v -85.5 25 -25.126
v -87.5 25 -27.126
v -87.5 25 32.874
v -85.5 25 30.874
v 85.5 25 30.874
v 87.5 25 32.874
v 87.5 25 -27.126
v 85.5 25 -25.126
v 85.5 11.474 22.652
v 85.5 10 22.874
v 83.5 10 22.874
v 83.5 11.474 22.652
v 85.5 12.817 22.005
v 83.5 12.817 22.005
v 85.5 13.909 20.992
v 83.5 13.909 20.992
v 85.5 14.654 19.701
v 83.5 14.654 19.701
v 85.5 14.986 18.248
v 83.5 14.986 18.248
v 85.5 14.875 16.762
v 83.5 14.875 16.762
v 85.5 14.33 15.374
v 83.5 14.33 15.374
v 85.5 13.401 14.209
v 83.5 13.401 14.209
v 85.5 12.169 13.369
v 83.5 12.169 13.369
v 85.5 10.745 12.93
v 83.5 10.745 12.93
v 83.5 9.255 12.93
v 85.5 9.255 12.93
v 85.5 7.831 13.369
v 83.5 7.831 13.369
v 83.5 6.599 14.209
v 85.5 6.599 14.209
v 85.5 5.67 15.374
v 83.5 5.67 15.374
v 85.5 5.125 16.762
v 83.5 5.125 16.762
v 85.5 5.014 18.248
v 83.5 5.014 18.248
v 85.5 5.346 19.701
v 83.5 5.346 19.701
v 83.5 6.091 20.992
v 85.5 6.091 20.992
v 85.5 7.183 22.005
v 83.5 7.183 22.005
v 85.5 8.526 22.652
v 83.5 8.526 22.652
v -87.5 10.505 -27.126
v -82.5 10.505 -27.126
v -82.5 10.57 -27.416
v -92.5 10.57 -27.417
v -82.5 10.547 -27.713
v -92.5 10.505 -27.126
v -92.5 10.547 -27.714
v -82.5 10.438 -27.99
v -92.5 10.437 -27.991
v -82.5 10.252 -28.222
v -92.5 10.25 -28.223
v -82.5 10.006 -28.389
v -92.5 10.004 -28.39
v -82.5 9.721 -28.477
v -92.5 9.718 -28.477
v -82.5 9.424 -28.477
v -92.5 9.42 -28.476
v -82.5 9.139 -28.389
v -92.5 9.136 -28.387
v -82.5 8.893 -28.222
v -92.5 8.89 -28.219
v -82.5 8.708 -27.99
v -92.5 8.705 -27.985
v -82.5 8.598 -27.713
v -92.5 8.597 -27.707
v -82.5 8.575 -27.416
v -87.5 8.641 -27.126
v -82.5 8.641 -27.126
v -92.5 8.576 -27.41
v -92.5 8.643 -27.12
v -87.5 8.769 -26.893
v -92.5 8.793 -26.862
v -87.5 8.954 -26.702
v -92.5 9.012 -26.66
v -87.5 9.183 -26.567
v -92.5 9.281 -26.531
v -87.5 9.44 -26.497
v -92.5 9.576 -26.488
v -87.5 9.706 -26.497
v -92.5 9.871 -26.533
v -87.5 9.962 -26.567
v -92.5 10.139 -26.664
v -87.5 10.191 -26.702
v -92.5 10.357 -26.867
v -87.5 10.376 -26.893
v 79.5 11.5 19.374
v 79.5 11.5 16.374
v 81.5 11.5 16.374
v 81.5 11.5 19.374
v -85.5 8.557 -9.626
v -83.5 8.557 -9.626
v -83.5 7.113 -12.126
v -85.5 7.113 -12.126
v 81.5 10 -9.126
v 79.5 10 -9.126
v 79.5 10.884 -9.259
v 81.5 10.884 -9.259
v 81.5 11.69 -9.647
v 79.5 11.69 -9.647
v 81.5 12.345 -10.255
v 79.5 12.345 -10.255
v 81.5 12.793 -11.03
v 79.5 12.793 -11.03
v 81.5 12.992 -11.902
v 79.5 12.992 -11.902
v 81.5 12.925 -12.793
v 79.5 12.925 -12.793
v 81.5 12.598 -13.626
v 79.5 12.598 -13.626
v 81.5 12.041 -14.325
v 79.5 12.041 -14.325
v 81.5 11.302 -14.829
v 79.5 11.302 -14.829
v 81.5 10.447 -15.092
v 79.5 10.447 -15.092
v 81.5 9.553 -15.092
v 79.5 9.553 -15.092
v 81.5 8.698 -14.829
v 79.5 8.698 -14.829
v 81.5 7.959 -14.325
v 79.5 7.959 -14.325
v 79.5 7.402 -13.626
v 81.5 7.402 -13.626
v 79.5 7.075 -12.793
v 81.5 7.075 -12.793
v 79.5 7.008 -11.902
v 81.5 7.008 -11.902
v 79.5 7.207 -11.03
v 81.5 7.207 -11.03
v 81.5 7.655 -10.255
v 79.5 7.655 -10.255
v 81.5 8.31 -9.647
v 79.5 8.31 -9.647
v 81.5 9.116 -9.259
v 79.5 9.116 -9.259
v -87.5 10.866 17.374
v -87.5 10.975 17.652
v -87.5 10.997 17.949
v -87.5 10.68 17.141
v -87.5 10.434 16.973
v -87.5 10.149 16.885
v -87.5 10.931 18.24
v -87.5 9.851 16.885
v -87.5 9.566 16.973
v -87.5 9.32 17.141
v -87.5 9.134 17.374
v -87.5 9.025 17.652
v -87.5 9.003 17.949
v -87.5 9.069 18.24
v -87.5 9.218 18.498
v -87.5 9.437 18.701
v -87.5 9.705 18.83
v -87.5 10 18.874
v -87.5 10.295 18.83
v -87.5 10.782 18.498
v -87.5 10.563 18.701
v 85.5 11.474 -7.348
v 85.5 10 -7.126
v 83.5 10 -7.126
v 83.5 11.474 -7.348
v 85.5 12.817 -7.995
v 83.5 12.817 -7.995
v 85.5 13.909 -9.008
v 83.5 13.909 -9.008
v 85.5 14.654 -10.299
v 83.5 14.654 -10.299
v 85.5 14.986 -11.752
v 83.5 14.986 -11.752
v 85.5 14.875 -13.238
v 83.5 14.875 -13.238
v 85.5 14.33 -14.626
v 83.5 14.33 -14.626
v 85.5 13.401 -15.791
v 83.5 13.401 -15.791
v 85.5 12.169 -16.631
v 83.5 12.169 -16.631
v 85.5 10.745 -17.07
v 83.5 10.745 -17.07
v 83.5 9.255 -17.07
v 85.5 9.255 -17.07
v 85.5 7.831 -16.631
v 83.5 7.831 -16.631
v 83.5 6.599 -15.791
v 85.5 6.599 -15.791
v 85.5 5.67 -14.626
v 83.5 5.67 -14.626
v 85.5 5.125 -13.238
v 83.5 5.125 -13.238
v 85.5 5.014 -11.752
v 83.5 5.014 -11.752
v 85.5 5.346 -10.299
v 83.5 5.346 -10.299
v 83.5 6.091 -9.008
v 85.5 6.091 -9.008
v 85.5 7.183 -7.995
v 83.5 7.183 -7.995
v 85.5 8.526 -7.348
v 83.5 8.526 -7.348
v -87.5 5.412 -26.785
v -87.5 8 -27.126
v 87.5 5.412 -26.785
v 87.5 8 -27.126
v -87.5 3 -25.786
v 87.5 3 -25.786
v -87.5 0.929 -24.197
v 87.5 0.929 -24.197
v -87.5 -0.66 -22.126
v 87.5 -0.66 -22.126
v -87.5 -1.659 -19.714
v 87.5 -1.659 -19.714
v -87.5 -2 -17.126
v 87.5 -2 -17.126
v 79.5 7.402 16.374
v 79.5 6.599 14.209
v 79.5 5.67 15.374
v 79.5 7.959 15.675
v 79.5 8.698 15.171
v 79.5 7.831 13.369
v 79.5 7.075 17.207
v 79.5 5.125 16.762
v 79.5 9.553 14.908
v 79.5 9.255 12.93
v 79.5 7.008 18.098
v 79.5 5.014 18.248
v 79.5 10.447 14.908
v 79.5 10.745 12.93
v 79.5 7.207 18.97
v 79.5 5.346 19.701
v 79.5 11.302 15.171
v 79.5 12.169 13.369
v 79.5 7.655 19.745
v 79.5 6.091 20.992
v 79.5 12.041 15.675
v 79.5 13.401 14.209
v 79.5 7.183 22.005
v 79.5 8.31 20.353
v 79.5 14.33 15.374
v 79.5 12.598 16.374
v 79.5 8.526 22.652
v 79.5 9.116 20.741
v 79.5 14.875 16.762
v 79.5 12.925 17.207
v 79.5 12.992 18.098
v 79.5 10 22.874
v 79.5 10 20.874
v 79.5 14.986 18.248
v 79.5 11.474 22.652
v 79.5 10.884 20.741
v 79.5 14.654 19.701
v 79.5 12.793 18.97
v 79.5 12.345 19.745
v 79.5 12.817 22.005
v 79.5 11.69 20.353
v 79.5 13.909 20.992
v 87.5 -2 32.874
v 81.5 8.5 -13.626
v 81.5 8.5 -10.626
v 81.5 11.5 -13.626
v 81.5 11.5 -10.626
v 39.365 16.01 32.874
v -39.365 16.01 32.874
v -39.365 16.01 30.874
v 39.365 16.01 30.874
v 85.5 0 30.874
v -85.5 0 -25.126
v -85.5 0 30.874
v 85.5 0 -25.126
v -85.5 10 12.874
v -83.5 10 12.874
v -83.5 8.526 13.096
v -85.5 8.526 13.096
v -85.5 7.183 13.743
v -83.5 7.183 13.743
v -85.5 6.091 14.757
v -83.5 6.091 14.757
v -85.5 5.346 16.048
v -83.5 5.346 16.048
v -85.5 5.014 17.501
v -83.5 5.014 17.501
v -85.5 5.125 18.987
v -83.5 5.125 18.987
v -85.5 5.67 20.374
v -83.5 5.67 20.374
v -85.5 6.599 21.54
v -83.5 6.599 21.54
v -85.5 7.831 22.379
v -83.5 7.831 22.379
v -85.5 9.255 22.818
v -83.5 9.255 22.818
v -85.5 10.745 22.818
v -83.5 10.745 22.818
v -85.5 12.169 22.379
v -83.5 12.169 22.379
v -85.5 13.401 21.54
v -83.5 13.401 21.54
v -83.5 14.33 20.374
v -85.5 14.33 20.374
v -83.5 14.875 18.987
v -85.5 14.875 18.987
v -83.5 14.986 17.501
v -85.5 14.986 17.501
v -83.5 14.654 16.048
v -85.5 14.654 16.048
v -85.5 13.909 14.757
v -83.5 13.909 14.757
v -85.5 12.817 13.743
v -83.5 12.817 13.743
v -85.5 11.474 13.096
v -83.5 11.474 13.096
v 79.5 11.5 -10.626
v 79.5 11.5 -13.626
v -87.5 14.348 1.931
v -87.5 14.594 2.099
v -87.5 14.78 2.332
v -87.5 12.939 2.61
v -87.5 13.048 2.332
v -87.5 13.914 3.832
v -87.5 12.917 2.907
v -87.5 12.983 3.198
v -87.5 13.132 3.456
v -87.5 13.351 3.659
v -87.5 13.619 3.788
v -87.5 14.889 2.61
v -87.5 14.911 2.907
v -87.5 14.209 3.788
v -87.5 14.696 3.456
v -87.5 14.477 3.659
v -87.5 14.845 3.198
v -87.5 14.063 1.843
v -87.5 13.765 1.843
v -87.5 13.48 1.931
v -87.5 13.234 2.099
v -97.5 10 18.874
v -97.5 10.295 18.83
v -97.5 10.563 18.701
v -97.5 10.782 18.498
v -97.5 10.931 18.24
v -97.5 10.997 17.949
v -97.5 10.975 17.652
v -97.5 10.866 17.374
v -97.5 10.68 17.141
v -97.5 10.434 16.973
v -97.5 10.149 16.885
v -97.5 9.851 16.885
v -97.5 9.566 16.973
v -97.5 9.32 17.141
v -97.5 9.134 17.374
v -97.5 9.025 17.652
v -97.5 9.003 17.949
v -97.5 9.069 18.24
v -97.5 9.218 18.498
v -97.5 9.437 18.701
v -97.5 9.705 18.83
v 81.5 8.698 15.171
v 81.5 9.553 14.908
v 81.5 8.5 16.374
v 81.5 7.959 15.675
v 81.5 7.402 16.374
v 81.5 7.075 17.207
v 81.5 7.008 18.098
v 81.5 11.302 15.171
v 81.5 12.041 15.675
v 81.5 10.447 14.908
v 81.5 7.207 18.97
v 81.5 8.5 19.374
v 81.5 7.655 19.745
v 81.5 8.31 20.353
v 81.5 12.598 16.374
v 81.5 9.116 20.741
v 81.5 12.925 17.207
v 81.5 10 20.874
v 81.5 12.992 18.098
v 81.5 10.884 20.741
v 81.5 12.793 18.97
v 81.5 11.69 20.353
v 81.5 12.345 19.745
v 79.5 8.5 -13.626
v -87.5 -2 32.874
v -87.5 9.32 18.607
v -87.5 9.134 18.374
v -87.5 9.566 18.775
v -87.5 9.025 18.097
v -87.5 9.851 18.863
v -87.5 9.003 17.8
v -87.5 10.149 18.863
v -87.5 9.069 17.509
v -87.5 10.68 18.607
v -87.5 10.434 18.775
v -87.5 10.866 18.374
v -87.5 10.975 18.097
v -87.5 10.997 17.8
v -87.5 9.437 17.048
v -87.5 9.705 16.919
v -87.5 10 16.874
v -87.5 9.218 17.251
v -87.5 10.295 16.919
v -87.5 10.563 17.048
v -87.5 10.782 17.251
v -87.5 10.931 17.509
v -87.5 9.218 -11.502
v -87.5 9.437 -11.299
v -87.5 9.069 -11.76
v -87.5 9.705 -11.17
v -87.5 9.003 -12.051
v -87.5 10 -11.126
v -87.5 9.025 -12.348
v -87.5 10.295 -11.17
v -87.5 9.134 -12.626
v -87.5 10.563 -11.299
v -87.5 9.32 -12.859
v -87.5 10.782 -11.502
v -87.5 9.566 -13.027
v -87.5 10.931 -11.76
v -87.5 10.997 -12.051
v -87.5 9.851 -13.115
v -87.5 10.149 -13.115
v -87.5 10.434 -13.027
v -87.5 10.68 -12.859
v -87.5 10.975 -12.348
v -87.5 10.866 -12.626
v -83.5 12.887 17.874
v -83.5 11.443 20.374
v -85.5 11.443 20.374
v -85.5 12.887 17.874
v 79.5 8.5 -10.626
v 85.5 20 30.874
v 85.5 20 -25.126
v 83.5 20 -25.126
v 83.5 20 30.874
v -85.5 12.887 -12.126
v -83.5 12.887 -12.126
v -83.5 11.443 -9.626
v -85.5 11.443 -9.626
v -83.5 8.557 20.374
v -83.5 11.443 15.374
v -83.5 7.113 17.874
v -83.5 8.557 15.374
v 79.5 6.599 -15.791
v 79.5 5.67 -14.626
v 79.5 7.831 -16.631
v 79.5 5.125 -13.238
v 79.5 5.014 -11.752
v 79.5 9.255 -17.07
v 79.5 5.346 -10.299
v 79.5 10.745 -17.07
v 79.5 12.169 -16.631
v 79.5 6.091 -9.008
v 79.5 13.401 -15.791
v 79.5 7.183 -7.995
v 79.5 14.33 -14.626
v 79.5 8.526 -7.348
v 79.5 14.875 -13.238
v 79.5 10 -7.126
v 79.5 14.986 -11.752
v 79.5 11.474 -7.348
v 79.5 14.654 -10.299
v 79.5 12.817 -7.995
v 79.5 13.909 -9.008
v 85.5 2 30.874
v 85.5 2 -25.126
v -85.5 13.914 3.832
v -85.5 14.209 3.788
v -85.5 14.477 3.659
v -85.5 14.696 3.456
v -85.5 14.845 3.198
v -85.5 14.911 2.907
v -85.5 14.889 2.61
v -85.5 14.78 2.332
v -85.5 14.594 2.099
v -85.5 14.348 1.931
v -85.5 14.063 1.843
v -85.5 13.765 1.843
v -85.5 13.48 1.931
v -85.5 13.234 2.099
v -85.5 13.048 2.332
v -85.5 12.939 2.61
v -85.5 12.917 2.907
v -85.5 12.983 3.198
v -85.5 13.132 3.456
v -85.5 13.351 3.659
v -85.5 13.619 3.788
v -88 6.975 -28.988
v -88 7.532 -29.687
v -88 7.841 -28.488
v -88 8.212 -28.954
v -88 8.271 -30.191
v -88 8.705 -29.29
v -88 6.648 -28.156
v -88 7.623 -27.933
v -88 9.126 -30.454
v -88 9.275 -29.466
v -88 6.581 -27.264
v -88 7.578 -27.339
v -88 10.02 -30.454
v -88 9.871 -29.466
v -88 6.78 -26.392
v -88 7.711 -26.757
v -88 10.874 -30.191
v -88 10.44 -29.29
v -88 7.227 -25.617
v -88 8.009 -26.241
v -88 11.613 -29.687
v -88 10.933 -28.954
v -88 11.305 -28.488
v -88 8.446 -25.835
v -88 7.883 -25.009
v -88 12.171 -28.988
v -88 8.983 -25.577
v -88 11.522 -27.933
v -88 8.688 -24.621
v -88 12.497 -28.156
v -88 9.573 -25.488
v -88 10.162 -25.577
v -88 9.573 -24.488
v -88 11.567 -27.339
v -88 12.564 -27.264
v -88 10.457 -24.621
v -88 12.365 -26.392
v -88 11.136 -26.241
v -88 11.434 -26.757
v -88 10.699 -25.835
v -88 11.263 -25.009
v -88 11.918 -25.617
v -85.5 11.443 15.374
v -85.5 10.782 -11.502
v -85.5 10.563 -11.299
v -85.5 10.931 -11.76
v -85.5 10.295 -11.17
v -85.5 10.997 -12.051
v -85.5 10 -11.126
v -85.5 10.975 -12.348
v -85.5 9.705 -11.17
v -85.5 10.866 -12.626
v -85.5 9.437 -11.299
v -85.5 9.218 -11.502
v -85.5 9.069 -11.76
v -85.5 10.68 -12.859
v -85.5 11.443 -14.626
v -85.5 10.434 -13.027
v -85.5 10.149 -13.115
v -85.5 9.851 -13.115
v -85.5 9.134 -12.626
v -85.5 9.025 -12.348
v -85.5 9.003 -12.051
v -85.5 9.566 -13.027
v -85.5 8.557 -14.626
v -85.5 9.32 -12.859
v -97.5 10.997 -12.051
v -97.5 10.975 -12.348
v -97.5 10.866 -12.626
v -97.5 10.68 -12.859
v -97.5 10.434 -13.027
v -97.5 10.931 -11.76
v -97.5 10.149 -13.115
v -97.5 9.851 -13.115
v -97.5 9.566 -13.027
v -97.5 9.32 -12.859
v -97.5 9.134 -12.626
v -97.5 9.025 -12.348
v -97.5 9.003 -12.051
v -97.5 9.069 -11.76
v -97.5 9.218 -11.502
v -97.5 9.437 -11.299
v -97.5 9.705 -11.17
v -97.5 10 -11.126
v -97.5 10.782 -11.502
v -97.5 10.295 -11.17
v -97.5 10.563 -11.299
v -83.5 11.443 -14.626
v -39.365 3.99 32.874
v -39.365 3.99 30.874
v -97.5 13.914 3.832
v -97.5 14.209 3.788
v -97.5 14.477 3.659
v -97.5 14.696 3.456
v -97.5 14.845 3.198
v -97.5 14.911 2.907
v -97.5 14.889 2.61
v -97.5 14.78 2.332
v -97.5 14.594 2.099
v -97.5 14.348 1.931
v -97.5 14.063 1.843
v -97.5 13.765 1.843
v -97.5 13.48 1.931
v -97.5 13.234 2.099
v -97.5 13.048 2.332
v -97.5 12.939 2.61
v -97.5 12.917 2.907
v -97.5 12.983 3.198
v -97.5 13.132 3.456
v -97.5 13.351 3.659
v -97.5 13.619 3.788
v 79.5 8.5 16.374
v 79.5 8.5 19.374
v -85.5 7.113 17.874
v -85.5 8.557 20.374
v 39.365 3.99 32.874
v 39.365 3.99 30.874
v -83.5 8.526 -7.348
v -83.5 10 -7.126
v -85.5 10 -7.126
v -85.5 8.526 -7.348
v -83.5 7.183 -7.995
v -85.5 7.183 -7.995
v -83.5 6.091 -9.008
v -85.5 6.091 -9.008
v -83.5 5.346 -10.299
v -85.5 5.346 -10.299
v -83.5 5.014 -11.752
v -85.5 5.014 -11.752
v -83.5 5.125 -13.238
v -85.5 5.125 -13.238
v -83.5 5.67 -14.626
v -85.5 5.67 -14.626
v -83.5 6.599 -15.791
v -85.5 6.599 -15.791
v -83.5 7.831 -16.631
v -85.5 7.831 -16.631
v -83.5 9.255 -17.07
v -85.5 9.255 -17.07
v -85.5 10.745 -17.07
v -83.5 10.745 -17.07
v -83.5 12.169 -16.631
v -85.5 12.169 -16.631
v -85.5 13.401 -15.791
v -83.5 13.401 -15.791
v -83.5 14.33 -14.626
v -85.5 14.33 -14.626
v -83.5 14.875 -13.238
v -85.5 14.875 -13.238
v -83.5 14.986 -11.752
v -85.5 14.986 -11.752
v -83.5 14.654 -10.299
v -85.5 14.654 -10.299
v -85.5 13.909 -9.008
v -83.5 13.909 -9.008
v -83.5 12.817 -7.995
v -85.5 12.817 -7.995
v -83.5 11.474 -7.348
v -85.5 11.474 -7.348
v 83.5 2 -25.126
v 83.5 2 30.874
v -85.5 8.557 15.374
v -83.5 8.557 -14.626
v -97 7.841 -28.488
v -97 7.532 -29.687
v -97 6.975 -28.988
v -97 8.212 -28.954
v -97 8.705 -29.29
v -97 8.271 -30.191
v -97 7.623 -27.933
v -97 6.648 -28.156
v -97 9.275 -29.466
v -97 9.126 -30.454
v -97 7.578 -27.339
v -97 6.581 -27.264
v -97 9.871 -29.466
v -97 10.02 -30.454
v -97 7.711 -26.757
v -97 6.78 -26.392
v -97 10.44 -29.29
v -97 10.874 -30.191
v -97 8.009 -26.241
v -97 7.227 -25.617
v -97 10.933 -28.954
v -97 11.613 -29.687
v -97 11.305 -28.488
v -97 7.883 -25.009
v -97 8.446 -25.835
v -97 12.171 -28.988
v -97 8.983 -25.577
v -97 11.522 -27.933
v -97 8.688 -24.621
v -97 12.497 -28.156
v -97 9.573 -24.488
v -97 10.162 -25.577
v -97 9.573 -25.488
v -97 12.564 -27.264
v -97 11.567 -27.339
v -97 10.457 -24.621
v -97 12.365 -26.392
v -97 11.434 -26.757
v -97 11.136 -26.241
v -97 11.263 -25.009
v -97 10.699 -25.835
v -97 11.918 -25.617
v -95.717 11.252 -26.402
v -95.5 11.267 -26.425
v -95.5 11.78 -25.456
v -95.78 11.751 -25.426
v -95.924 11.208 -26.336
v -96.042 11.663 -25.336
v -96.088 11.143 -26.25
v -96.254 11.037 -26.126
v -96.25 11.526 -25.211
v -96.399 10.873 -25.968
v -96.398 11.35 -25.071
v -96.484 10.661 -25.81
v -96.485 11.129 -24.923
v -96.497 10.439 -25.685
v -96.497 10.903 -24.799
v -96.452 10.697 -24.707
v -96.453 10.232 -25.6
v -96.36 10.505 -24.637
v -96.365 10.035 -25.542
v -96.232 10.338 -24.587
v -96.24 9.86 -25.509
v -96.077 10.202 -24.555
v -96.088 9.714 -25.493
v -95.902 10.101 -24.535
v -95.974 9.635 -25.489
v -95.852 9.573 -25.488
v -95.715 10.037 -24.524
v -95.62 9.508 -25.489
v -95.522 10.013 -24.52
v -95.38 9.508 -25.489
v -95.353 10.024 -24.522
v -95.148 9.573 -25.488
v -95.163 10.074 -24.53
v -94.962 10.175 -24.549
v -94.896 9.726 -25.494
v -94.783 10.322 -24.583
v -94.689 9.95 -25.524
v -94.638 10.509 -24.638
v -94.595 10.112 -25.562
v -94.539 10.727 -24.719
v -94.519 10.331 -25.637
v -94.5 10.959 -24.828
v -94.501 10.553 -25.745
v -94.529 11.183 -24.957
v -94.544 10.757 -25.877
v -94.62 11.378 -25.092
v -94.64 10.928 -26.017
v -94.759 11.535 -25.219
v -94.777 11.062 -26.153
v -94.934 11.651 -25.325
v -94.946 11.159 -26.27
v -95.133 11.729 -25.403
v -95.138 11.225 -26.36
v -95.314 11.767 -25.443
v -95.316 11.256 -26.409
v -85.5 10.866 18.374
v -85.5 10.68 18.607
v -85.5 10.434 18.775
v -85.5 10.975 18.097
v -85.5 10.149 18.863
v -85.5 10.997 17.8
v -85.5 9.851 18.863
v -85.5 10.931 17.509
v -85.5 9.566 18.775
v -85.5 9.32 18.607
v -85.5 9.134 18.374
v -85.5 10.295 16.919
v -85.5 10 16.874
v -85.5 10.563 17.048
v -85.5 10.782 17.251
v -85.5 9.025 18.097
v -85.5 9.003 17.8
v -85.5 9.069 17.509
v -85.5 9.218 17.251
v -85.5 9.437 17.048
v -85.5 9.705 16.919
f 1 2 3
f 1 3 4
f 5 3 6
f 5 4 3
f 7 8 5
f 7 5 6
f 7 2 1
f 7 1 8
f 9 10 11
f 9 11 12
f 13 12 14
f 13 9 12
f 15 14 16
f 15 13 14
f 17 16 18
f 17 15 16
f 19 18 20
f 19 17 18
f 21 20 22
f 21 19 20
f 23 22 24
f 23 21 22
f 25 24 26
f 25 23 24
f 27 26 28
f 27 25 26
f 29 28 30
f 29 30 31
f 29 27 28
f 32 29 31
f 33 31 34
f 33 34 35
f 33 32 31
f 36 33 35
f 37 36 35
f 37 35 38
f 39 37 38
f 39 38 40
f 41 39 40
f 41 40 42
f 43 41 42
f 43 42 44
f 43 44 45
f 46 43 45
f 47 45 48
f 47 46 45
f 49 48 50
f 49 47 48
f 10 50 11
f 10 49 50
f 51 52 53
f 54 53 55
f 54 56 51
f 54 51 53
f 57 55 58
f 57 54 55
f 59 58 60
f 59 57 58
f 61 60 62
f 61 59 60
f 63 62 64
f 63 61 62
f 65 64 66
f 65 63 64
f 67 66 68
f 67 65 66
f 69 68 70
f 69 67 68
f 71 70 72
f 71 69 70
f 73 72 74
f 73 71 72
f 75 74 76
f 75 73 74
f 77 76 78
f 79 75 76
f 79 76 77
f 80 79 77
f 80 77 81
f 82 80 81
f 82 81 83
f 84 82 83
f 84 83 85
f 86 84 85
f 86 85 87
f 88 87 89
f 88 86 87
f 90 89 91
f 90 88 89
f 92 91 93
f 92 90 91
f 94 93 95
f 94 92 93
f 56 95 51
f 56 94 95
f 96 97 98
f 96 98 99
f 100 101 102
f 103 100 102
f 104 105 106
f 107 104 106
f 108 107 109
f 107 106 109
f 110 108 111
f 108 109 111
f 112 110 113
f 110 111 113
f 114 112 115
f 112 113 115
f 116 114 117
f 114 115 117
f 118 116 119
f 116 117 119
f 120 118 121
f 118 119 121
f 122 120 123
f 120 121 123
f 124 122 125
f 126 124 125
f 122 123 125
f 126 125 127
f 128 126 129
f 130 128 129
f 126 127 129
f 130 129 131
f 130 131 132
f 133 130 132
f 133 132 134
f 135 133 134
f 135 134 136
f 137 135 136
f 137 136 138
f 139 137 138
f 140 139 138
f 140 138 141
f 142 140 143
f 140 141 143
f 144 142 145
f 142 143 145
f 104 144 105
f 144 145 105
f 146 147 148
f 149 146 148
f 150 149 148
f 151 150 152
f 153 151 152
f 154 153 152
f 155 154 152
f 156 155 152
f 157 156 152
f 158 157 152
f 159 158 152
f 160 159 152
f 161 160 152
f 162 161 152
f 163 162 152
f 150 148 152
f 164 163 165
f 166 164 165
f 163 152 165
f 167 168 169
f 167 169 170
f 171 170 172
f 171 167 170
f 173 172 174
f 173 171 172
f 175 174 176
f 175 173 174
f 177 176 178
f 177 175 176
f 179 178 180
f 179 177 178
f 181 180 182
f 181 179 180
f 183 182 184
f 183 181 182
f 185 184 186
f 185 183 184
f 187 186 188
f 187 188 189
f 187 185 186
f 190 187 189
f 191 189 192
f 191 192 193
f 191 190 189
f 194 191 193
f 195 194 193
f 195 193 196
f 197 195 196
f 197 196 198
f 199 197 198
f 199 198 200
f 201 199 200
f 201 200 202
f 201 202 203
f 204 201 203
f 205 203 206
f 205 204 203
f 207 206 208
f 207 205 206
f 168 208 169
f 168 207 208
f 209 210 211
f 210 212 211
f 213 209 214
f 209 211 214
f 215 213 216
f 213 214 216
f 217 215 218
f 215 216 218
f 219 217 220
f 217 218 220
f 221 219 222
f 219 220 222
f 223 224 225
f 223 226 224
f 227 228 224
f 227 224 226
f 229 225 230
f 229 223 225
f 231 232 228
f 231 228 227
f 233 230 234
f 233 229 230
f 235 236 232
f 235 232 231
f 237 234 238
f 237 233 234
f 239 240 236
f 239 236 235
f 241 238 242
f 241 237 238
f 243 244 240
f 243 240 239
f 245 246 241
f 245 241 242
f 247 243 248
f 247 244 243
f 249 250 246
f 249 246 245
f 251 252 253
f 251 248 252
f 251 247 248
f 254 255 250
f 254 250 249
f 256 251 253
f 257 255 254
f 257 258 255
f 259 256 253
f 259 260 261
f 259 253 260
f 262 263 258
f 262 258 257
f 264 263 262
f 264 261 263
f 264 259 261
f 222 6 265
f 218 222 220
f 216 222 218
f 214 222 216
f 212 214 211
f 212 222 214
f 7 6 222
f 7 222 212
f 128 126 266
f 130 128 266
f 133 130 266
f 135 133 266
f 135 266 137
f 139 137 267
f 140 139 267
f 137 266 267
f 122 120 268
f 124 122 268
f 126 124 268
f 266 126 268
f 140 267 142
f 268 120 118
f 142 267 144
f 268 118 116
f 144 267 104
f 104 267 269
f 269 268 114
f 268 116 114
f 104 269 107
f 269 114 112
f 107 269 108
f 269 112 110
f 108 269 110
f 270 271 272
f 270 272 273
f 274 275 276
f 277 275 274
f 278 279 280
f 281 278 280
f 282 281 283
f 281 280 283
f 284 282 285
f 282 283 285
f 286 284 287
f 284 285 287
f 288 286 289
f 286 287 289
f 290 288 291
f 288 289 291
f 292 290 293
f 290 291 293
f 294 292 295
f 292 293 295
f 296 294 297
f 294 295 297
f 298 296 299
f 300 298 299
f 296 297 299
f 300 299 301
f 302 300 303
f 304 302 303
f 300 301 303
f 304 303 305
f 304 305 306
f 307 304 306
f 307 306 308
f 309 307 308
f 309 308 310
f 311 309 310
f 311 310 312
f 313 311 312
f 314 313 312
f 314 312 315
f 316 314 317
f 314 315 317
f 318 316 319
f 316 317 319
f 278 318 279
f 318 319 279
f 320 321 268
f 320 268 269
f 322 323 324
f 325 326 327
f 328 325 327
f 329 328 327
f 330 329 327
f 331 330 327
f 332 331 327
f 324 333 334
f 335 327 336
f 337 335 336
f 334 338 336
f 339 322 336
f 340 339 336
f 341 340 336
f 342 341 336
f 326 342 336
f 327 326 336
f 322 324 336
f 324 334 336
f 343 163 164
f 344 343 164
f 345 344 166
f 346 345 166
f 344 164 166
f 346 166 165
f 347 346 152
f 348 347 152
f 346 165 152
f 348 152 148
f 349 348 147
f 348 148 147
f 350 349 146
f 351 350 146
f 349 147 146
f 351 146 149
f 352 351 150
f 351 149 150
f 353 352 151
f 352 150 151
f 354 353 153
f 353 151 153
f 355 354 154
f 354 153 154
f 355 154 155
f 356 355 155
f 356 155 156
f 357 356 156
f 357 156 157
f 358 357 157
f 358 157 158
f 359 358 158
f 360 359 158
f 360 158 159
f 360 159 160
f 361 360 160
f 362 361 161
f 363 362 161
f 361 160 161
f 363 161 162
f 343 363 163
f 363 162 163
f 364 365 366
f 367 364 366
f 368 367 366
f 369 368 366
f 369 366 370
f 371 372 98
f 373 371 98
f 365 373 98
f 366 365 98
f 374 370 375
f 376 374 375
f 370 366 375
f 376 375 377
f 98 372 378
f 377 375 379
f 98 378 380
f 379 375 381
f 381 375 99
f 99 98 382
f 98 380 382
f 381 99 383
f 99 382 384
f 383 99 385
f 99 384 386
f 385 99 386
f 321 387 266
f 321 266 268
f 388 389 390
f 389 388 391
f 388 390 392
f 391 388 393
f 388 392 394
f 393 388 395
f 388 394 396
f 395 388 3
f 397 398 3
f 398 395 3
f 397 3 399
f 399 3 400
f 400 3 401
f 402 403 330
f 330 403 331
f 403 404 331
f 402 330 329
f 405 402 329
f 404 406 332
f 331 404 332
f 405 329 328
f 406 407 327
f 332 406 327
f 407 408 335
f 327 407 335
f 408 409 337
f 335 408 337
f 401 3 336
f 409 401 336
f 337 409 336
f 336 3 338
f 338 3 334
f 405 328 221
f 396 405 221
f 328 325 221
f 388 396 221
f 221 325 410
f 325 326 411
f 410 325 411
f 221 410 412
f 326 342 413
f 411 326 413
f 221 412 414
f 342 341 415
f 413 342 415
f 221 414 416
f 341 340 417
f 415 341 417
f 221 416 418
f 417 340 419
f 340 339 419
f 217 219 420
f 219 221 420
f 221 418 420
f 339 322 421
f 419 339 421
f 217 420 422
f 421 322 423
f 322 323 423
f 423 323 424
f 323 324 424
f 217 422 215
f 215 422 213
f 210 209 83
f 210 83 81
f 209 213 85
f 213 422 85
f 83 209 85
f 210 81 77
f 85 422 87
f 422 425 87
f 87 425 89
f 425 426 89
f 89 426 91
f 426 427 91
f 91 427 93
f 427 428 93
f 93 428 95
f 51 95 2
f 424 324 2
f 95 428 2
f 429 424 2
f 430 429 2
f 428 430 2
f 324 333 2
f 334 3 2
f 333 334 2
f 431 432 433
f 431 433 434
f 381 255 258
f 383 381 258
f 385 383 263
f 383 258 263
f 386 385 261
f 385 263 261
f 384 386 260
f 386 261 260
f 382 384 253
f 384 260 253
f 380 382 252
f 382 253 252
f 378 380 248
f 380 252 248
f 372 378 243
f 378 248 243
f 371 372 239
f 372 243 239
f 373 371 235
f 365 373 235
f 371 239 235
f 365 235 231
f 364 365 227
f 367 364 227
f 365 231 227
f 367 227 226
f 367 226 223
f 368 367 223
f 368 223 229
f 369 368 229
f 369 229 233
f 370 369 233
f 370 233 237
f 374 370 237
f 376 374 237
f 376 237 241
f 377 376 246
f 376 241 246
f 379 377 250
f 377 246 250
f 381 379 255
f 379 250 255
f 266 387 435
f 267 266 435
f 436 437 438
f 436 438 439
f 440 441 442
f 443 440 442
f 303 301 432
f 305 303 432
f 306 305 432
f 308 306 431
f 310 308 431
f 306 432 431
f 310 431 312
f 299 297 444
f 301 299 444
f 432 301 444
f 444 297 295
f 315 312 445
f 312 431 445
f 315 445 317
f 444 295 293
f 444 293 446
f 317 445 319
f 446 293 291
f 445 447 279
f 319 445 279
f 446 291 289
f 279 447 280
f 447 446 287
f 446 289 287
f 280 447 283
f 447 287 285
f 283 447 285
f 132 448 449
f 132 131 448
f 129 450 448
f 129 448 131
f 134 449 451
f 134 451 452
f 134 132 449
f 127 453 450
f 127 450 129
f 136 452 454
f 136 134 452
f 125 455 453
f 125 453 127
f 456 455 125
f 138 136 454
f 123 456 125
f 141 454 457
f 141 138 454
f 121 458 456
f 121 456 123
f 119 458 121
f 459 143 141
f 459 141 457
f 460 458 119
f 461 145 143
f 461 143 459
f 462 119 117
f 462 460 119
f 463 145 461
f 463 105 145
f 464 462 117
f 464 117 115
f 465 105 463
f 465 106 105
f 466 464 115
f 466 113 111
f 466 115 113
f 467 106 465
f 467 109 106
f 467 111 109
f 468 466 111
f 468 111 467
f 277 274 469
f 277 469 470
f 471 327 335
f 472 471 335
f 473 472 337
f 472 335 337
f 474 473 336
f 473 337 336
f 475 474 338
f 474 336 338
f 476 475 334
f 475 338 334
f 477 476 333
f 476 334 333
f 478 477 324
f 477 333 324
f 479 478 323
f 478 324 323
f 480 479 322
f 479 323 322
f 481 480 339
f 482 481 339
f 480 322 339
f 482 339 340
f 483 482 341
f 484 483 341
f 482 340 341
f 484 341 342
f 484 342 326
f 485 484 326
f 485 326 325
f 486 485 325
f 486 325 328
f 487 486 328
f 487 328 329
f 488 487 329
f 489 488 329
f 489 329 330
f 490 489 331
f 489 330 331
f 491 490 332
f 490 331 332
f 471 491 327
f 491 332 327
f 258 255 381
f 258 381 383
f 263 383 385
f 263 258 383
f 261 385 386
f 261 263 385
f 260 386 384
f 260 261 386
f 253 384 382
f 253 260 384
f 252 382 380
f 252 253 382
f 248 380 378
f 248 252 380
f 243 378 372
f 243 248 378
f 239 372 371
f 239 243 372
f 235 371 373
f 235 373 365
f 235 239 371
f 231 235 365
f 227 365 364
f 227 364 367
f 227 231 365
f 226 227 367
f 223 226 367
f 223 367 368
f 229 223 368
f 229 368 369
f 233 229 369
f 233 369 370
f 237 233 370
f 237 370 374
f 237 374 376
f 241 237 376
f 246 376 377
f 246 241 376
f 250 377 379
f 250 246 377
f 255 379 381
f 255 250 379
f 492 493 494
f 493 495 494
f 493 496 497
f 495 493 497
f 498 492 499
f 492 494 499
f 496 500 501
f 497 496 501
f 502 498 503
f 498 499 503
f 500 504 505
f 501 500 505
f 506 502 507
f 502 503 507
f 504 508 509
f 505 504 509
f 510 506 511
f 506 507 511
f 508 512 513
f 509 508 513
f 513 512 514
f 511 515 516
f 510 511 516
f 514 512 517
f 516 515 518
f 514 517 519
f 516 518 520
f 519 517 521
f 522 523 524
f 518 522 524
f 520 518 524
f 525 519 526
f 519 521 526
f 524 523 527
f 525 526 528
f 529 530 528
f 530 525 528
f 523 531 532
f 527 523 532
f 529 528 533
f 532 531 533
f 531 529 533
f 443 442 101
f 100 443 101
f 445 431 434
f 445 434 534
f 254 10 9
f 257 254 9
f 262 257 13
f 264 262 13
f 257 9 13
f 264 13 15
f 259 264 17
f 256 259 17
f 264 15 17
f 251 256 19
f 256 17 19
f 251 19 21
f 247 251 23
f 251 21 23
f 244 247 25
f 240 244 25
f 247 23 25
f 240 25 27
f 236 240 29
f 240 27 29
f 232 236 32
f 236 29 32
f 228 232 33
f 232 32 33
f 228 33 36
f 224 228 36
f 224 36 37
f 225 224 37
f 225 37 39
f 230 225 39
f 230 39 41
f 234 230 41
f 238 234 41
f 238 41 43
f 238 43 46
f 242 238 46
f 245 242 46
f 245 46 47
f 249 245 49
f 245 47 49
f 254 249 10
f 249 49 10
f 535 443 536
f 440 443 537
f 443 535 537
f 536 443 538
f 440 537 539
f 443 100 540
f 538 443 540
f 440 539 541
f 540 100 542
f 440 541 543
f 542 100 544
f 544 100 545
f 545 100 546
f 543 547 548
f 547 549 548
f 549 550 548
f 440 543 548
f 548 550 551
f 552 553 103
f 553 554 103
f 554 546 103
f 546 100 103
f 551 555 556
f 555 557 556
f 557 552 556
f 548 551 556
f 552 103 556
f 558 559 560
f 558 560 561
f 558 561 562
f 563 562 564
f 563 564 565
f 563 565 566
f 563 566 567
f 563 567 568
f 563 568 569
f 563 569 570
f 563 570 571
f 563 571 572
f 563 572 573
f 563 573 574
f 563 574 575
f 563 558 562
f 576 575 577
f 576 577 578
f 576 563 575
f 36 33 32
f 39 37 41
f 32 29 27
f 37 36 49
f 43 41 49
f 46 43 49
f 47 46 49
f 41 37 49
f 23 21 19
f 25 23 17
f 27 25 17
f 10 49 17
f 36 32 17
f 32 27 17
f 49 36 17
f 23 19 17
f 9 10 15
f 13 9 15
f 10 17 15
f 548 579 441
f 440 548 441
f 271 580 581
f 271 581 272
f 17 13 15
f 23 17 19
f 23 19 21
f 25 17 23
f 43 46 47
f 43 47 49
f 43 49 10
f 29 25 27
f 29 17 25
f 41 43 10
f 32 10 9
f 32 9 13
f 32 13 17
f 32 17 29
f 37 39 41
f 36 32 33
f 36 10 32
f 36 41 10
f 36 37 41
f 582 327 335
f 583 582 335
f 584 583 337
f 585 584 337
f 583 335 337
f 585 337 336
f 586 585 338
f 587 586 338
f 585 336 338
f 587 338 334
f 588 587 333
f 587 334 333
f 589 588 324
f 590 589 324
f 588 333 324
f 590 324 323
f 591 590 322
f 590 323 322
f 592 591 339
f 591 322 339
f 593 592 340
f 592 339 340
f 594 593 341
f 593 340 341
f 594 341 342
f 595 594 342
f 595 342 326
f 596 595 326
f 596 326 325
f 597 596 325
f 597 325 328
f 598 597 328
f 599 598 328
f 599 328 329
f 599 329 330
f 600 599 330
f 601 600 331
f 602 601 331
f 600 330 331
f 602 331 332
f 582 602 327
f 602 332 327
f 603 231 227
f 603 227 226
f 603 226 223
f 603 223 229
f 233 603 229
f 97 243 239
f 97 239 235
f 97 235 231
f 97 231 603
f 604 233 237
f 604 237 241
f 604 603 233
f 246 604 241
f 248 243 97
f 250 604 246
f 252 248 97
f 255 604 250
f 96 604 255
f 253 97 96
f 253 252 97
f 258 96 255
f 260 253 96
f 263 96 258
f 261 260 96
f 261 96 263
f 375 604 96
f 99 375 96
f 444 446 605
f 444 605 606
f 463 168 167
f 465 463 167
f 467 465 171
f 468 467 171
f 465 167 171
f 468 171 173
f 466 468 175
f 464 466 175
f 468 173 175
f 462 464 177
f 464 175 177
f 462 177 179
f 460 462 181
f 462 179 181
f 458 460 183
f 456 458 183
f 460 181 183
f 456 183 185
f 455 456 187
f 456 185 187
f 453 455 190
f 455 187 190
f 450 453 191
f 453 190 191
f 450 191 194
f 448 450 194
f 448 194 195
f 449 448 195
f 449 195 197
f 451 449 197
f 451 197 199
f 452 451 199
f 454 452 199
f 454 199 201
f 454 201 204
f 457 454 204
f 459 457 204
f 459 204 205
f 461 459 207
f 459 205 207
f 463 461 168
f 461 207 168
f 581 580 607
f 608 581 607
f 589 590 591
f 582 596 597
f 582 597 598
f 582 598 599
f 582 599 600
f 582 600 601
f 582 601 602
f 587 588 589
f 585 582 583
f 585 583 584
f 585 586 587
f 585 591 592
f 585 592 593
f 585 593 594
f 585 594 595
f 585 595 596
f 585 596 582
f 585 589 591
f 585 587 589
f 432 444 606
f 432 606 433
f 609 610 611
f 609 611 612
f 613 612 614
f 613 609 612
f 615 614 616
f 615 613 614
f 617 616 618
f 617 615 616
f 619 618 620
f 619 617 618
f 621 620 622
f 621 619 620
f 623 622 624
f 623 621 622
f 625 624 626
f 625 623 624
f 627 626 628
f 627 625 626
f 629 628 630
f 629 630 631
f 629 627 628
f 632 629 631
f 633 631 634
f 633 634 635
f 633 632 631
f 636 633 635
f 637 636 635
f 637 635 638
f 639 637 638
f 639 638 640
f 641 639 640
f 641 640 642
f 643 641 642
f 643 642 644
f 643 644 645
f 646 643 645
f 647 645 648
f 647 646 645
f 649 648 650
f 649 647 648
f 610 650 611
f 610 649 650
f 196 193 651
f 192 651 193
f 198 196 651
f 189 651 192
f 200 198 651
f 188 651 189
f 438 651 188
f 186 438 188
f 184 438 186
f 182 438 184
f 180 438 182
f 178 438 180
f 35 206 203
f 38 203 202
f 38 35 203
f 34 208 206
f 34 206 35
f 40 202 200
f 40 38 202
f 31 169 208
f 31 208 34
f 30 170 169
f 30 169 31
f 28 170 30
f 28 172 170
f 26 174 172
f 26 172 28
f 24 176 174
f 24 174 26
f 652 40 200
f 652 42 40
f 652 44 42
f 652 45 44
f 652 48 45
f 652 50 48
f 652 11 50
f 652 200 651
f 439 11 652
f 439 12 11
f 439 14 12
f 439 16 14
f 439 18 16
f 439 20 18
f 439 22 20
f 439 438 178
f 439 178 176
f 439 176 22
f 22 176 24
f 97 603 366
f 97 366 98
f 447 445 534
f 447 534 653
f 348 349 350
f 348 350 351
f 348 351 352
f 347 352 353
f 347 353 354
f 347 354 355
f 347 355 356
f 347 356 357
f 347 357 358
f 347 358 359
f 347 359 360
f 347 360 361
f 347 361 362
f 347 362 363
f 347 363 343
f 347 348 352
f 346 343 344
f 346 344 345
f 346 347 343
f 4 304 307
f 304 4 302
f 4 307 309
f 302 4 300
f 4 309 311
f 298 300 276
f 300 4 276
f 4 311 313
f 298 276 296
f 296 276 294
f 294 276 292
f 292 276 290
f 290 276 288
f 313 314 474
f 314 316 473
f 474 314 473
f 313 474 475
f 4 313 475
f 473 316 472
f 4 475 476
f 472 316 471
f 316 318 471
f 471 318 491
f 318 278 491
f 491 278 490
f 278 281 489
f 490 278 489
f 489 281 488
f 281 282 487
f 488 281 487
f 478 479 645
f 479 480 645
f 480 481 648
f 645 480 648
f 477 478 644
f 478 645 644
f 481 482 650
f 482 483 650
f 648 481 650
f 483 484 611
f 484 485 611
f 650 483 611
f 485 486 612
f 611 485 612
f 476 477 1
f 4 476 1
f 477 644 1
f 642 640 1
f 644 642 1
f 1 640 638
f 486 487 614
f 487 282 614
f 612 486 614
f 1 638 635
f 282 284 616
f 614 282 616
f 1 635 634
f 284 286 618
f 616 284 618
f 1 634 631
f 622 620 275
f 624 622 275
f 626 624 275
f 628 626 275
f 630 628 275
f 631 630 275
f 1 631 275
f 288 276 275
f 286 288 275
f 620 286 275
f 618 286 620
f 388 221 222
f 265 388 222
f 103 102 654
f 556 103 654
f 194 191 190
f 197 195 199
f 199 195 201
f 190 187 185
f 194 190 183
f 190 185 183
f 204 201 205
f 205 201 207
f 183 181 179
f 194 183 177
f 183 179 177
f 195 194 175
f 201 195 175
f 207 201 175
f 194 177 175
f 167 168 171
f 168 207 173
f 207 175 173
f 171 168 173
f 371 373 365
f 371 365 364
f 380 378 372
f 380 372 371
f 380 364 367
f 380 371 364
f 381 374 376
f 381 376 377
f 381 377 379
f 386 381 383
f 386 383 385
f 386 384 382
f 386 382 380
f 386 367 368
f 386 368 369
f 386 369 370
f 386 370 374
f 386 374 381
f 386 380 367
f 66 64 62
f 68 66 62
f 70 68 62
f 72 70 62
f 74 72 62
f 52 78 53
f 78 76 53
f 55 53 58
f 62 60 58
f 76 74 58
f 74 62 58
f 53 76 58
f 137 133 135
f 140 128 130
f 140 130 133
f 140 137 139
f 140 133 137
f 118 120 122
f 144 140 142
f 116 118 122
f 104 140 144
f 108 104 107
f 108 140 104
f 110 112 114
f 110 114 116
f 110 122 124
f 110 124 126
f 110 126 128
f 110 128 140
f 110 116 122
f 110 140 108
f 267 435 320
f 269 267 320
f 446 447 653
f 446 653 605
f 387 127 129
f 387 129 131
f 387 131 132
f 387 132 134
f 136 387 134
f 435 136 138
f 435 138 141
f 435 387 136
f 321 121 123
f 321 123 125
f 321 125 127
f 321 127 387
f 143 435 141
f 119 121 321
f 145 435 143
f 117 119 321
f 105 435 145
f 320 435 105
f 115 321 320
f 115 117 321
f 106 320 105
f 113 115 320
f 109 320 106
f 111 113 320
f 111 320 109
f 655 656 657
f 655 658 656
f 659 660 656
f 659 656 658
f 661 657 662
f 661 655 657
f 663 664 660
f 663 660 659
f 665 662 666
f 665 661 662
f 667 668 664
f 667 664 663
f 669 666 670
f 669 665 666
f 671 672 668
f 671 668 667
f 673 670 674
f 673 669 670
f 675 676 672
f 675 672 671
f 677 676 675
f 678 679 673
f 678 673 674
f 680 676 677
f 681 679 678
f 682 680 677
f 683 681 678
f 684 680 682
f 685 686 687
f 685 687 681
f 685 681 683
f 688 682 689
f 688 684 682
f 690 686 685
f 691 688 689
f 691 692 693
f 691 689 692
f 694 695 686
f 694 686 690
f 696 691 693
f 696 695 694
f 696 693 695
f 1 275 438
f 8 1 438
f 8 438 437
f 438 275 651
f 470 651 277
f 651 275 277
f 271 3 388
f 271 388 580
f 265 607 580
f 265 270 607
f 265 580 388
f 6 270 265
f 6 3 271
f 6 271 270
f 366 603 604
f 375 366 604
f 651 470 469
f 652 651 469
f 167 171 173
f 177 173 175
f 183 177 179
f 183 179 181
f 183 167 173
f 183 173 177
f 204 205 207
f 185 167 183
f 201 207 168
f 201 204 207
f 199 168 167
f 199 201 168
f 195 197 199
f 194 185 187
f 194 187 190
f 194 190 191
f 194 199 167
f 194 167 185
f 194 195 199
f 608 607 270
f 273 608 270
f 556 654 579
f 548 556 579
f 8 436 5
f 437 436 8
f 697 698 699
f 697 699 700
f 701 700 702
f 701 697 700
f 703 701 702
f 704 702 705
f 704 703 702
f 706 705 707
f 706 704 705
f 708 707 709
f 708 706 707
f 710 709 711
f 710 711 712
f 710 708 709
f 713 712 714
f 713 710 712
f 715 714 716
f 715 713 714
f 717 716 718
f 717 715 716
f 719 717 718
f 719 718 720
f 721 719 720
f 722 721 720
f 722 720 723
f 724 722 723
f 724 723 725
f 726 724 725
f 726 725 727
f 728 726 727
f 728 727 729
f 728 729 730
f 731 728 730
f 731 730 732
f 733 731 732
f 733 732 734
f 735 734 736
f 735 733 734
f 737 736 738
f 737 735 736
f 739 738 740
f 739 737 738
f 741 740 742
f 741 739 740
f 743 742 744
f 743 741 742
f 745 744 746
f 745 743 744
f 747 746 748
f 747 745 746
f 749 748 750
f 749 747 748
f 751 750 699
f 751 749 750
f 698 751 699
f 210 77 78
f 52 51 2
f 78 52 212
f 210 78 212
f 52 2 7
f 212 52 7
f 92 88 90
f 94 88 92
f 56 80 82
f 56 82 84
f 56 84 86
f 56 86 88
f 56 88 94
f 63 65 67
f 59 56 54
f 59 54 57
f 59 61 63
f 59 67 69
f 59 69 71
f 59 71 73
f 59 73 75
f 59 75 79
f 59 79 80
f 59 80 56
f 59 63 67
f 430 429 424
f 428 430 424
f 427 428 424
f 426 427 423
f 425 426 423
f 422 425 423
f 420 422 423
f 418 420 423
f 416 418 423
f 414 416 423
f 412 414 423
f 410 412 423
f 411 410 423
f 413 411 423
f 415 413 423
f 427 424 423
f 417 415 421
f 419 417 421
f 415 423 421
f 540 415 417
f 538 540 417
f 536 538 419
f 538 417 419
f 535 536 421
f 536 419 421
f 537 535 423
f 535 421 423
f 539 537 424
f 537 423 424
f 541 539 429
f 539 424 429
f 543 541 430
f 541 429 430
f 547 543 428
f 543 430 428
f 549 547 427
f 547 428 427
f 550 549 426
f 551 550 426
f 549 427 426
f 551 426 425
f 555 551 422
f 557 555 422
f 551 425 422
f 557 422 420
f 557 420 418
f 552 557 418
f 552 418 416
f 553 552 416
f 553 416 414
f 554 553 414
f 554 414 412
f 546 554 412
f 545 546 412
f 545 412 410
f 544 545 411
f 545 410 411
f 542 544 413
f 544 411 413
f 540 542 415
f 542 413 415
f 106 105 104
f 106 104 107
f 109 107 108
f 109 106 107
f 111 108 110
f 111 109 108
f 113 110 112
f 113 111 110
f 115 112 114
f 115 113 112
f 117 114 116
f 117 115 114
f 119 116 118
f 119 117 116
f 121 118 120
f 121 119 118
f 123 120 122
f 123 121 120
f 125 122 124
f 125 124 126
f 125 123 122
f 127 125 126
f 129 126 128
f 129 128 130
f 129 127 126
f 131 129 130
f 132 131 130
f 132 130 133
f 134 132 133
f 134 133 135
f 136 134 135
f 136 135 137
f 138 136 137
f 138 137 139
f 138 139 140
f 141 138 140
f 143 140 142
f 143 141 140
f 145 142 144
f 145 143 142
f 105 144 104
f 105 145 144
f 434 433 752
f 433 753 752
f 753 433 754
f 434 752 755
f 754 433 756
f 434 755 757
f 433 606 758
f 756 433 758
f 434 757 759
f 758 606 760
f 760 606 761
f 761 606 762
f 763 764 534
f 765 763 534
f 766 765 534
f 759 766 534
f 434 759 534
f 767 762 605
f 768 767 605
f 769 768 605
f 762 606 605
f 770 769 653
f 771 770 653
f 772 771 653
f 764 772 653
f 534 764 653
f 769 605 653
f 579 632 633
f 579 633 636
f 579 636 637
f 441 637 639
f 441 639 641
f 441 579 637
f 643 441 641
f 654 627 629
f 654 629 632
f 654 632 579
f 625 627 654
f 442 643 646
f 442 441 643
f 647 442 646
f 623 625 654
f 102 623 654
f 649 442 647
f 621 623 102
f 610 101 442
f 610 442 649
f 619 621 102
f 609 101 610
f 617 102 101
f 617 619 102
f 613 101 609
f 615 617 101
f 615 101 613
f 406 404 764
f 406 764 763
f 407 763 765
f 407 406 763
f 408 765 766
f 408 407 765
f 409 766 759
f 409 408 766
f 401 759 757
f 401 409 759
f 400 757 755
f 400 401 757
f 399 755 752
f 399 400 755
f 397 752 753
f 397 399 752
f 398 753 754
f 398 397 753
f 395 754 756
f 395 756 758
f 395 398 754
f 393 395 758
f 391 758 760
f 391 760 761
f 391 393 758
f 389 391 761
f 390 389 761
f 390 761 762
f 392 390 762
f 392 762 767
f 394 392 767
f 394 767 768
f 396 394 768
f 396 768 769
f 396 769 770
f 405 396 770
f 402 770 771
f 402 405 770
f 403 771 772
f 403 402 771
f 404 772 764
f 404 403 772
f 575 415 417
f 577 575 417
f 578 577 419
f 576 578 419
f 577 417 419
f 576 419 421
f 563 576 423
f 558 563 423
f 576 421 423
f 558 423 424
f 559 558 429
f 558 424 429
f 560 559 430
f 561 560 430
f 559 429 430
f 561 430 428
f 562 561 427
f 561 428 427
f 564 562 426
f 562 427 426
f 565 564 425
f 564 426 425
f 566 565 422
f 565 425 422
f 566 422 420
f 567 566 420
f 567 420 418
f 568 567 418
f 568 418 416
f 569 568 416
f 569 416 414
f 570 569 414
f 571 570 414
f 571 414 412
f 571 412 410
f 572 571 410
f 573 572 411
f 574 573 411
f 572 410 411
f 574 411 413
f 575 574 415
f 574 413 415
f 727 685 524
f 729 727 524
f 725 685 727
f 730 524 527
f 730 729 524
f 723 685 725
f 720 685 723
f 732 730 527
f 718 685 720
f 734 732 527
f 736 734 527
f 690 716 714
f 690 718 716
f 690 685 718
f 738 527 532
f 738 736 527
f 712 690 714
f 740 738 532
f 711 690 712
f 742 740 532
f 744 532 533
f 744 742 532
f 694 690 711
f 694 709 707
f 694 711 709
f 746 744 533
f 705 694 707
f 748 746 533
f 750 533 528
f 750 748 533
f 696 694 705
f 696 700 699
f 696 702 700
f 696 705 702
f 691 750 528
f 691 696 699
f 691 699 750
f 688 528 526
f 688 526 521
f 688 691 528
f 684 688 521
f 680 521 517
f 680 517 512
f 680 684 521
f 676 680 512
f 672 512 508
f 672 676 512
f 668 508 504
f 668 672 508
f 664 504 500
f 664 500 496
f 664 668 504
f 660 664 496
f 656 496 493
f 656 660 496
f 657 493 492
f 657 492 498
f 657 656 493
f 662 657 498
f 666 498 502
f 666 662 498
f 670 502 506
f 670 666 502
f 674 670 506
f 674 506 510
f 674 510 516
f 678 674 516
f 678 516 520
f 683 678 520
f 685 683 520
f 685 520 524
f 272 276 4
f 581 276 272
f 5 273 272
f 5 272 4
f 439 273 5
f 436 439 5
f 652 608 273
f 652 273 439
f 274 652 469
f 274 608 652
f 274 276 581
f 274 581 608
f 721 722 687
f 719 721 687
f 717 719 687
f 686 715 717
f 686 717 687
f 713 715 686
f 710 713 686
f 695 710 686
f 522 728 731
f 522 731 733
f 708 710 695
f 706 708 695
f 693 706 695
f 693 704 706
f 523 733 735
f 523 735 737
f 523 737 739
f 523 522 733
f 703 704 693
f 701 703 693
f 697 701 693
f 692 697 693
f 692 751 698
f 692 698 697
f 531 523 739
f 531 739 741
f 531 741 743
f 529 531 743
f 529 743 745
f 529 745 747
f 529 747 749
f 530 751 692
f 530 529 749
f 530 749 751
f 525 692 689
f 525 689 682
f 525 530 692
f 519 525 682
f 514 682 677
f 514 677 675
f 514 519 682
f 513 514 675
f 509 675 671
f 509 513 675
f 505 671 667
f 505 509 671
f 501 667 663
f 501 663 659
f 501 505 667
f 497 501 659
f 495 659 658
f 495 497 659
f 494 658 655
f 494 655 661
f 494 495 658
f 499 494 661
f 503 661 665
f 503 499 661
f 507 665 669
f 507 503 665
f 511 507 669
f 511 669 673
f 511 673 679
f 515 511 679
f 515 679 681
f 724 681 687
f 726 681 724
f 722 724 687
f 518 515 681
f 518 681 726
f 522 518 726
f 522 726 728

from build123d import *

# Parameters (mm, degrees)
SKETCH1_W              = 175
SKETCH1_H              = 60
SKETCH1_W_2            = 171
SKETCH1_H_2            = 56
BOSS_EXTRUDE1_DEPTH    = 25
SKETCH1_2_W            = 175
SKETCH1_2_H            = 60
BOSS_EXTRUDE2_DEPTH    = 2
SKETCH3_W              = 78.730351058
SKETCH3_H              = 12.02010903
CUT_EXTRUDE2_DEPTH     = 2
SKETCH5_W              = 56
SKETCH5_H              = 18
SKETCH5_R              = 5
BOSS_EXTRUDE3_DEPTH    = 2
SKETCH5_4_R            = 5
BOSS_EXTRUDE4_DEPTH    = 6
BOSS_EXTRUDE4_2_DEPTH  = 6
SKETCH9_R              = 3
CUT_EXTRUDE3_DEPTH     = 2
SKETCH9_3_R            = 3
BOSS_EXTRUDE5_DEPTH    = 2
SKETCH6_W              = 3
SKETCH6_H              = 3
CUT_EXTRUDE4_DEPTH     = 2
SKETCH8_R              = 1
CUT_EXTRUDE5_DEPTH     = 2
BOSS_EXTRUDE8_START    = 2
SKETCH10_R             = 5
BOSS_EXTRUDE8_DEPTH    = 2
SKETCH11_R             = 3
SKETCH11_W             = 3
SKETCH11_H             = 3
CUT_EXTRUDE6_DEPTH     = 2
SKETCH11_3_R           = 3
SKETCH11_3_W           = 3
SKETCH11_3_H           = 3
BOSS_EXTRUDE9_DEPTH    = 2
SKETCH12_R             = 1
CUT_EXTRUDE7_DEPTH     = 2
SKETCH13_R             = 1
BOSS_EXTRUDE10_DEPTH   = 5
SKETCH14_R             = 3
SKETCH14_R_2           = 2
BOSS_EXTRUDE11_DEPTH   = 4.5
FILLET1_R              = 10
SKETCH15_R             = 1
BOSS_EXTRUDE12_DEPTH   = 10
BOSS_EXTRUDE12_2_DEPTH = 10
BOSS_EXTRUDE12_3_DEPTH = 10
SKETCH16_R             = 1
CUT_EXTRUDE9_DEPTH     = 3


with BuildPart() as part:
    # Sketch1 → Boss-Extrude1 (new body)
    with BuildSketch(Plane(origin=(0, 0, 0), x_dir=(1, 0, 0), z_dir=(0, 1, 0))):
        with Locations((0, -2.874293785)):
            Rectangle(SKETCH1_W, SKETCH1_H)
        with Locations((0, -2.874293785)):
            Rectangle(SKETCH1_W_2, SKETCH1_H_2, mode=Mode.SUBTRACT)
    extrude(amount=BOSS_EXTRUDE1_DEPTH)

    # Sketch1<2> → Boss-Extrude2 (add)
    with BuildSketch(Plane(origin=(0, 0, 0), x_dir=(1, 0, 0), z_dir=(0, 1, 0))):
        with Locations((0, -2.874293785)):
            Rectangle(SKETCH1_2_W, SKETCH1_2_H)
    extrude(amount=-BOSS_EXTRUDE2_DEPTH)

    # Sketch3 → Cut-Extrude2 (cut)
    with BuildSketch(Plane.XY.offset(32.874293785)):
        with Locations((0, 10)):
            Rectangle(SKETCH3_W, SKETCH3_H)
    extrude(amount=-CUT_EXTRUDE2_DEPTH, mode=Mode.SUBTRACT)

    # Sketch5 → Boss-Extrude3 (add)
    with BuildSketch(Plane.ZY.offset(-85.5)):
        with Locations((2.874293785, 11)):
            Rectangle(SKETCH5_W, SKETCH5_H)
        with Locations((17.874293785, 10)):
            Circle(SKETCH5_R, mode=Mode.SUBTRACT)
        with Locations((-12.125706215, 10)):
            Circle(SKETCH5_R, mode=Mode.SUBTRACT)
    extrude(amount=BOSS_EXTRUDE3_DEPTH)

    # Sketch8 → Cut-Extrude5 (cut)
    with BuildSketch(Plane.ZY.offset(87.5)):
        with Locations((-12.125706215, 10)):
            Circle(SKETCH8_R)
    cut_extrude5 = extrude(amount=-CUT_EXTRUDE5_DEPTH, mode=Mode.SUBTRACT)

    # Sketch10 → Boss-Extrude8 (add)
    with BuildSketch(Plane(origin=(-85.5, 0, 0), x_dir=(0, 0, -1), z_dir=(1, 0, 0)).offset(BOSS_EXTRUDE8_START)):
        with Locations(Location((12.125706215, 10, 0), (0, 0, 180))):
            Circle(SKETCH10_R)
        Polygon((12.125706215, 12.886751346), (9.625706215, 11.443375673), (9.625706215, 8.556624327), (12.125706215, 7.113248654), (14.625706215, 8.556624327), (14.625706215, 11.443375673), align=None, mode=Mode.SUBTRACT)
    boss_extrude8 = extrude(amount=-BOSS_EXTRUDE8_DEPTH)

    # Mirror1: Cut-Extrude5, Boss-Extrude8 across plane
    add(cut_extrude5.mirror(Plane.XY.offset(2.874293785)), mode=Mode.SUBTRACT)
    add(boss_extrude8.mirror(Plane.XY.offset(2.874293785)))

    # Sketch12 → Cut-Extrude7 (cut)
    with BuildSketch(Plane.ZY.offset(87.5)):
        with Locations((2.832267692, 13.914049176)):
            Circle(SKETCH12_R)
    extrude(amount=-CUT_EXTRUDE7_DEPTH, mode=Mode.SUBTRACT)

    # Sketch13 → Boss-Extrude10 (add, symmetric)
    with BuildSketch(Plane.ZY.offset(87.5)):
        with Locations(Location((-27.48796233, 9.572637011, 0), (0, 0, 68.76118338))):
            Circle(SKETCH13_R)
    extrude(amount=BOSS_EXTRUDE10_DEPTH, both=True)

    # Fillet1
    fillet1_edges = [part.edges().sort_by_distance(p)[0] for p in [
        (0, -2, -27.125706215),
    ]]
    fillet(fillet1_edges, radius=FILLET1_R)


with BuildPart() as body_2:
    # Sketch5<4> → Boss-Extrude4 (new body)
    with BuildSketch(Plane.ZY.offset(-85.5)):
        with Locations((17.874293785, 10)):
            Circle(SKETCH5_4_R)
    extrude(amount=BOSS_EXTRUDE4_DEPTH)

    # Sketch11 → Cut-Extrude6 (cut)
    # profile 1 of 2: a face of its own
    with BuildSketch(Plane.ZY.offset(-79.5)):
        with Locations((17.874293785, 10)):
            Circle(SKETCH11_R)
        with Locations((17.874293785, 10)):
            Rectangle(SKETCH11_W, SKETCH11_H, mode=Mode.SUBTRACT)
    # profile 2 of 2: a face of its own
    with BuildSketch(Plane.ZY.offset(-79.5)):
        with Locations((17.874293785, 10)):
            Rectangle(SKETCH11_W, SKETCH11_H)
    extrude(amount=-CUT_EXTRUDE6_DEPTH, mode=Mode.SUBTRACT)


with BuildPart() as body_3:
    # Sketch5<4> → Boss-Extrude4 2 (new body)
    with BuildSketch(Plane.ZY.offset(-85.5)):
        with Locations((-12.125706215, 10)):
            Circle(SKETCH5_4_R)
    extrude(amount=BOSS_EXTRUDE4_2_DEPTH)

    # Sketch9 → Cut-Extrude3 (cut)
    with BuildSketch(Plane.ZY.offset(-79.5)):
        with Locations((-12.125706215, 10)):
            Circle(SKETCH9_R)
    extrude(amount=-CUT_EXTRUDE3_DEPTH, mode=Mode.SUBTRACT)


with BuildPart() as body_4:
    # Sketch9<3> → Boss-Extrude5 (new body)
    with BuildSketch(Plane.ZY.offset(-79.5)):
        with Locations((-12.125706215, 10)):
            Circle(SKETCH9_3_R)
    extrude(amount=-BOSS_EXTRUDE5_DEPTH)

    # Sketch6 → Cut-Extrude4 (cut)
    with BuildSketch(Plane.ZY.offset(-79.5)):
        with Locations((-12.125706215, 10)):
            Rectangle(SKETCH6_W, SKETCH6_H)
    extrude(amount=-CUT_EXTRUDE4_DEPTH, mode=Mode.SUBTRACT)


with BuildPart() as body_5:
    # Sketch11<3> → Boss-Extrude9 (new body)
    with BuildSketch(Plane.ZY.offset(-79.5)):
        with Locations((17.874293785, 10)):
            Circle(SKETCH11_3_R)
        with Locations((17.874293785, 10)):
            Rectangle(SKETCH11_3_W, SKETCH11_3_H, mode=Mode.SUBTRACT)
    extrude(amount=-BOSS_EXTRUDE9_DEPTH)


with BuildPart() as body_6:
    # Sketch14 → Boss-Extrude11 (new, symmetric)
    with BuildSketch(Plane.ZY.offset(92.5)):
        with Locations((-27.48796233, 9.572637011)):
            Circle(SKETCH14_R)
        with Locations((-27.48796233, 9.572637011)):
            Circle(SKETCH14_R_2, mode=Mode.SUBTRACT)
    extrude(amount=BOSS_EXTRUDE11_DEPTH, both=True)

    # Sketch16 → Cut-Extrude9 (cut)
    with BuildSketch(Plane(origin=(0, -8.781042983, -16.580502058), x_dir=(1, 0, 0), z_dir=(0, 0.4680180244417621, 0.8837189195652826))):
        with Locations(Location((-95.5, 21.324382263, 0), (0, 0, 90))):
            Circle(SKETCH16_R)
    extrude(amount=CUT_EXTRUDE9_DEPTH, mode=Mode.SUBTRACT)


with BuildPart() as body_7:
    # Sketch15 → Boss-Extrude12 (new body)
    with BuildSketch(Plane.ZY.offset(87.5)):
        with Locations((-12.125706215, 10)):
            Circle(SKETCH15_R)
    extrude(amount=BOSS_EXTRUDE12_DEPTH)


with BuildPart() as body_8:
    # Sketch15 → Boss-Extrude12 2 (new body)
    with BuildSketch(Plane.ZY.offset(87.5)):
        with Locations((2.832267692, 13.914049176)):
            Circle(SKETCH15_R)
    extrude(amount=BOSS_EXTRUDE12_2_DEPTH)


with BuildPart() as body_9:
    # Sketch15 → Boss-Extrude12 3 (new body)
    with BuildSketch(Plane.ZY.offset(87.5)):
        with Locations((17.874293785, 10)):
            Circle(SKETCH15_R)
    extrude(amount=BOSS_EXTRUDE12_3_DEPTH)


solid = Compound([part.part, body_2.part, body_3.part, body_4.part, body_5.part, body_6.part, body_7.part, body_8.part, body_9.part])
